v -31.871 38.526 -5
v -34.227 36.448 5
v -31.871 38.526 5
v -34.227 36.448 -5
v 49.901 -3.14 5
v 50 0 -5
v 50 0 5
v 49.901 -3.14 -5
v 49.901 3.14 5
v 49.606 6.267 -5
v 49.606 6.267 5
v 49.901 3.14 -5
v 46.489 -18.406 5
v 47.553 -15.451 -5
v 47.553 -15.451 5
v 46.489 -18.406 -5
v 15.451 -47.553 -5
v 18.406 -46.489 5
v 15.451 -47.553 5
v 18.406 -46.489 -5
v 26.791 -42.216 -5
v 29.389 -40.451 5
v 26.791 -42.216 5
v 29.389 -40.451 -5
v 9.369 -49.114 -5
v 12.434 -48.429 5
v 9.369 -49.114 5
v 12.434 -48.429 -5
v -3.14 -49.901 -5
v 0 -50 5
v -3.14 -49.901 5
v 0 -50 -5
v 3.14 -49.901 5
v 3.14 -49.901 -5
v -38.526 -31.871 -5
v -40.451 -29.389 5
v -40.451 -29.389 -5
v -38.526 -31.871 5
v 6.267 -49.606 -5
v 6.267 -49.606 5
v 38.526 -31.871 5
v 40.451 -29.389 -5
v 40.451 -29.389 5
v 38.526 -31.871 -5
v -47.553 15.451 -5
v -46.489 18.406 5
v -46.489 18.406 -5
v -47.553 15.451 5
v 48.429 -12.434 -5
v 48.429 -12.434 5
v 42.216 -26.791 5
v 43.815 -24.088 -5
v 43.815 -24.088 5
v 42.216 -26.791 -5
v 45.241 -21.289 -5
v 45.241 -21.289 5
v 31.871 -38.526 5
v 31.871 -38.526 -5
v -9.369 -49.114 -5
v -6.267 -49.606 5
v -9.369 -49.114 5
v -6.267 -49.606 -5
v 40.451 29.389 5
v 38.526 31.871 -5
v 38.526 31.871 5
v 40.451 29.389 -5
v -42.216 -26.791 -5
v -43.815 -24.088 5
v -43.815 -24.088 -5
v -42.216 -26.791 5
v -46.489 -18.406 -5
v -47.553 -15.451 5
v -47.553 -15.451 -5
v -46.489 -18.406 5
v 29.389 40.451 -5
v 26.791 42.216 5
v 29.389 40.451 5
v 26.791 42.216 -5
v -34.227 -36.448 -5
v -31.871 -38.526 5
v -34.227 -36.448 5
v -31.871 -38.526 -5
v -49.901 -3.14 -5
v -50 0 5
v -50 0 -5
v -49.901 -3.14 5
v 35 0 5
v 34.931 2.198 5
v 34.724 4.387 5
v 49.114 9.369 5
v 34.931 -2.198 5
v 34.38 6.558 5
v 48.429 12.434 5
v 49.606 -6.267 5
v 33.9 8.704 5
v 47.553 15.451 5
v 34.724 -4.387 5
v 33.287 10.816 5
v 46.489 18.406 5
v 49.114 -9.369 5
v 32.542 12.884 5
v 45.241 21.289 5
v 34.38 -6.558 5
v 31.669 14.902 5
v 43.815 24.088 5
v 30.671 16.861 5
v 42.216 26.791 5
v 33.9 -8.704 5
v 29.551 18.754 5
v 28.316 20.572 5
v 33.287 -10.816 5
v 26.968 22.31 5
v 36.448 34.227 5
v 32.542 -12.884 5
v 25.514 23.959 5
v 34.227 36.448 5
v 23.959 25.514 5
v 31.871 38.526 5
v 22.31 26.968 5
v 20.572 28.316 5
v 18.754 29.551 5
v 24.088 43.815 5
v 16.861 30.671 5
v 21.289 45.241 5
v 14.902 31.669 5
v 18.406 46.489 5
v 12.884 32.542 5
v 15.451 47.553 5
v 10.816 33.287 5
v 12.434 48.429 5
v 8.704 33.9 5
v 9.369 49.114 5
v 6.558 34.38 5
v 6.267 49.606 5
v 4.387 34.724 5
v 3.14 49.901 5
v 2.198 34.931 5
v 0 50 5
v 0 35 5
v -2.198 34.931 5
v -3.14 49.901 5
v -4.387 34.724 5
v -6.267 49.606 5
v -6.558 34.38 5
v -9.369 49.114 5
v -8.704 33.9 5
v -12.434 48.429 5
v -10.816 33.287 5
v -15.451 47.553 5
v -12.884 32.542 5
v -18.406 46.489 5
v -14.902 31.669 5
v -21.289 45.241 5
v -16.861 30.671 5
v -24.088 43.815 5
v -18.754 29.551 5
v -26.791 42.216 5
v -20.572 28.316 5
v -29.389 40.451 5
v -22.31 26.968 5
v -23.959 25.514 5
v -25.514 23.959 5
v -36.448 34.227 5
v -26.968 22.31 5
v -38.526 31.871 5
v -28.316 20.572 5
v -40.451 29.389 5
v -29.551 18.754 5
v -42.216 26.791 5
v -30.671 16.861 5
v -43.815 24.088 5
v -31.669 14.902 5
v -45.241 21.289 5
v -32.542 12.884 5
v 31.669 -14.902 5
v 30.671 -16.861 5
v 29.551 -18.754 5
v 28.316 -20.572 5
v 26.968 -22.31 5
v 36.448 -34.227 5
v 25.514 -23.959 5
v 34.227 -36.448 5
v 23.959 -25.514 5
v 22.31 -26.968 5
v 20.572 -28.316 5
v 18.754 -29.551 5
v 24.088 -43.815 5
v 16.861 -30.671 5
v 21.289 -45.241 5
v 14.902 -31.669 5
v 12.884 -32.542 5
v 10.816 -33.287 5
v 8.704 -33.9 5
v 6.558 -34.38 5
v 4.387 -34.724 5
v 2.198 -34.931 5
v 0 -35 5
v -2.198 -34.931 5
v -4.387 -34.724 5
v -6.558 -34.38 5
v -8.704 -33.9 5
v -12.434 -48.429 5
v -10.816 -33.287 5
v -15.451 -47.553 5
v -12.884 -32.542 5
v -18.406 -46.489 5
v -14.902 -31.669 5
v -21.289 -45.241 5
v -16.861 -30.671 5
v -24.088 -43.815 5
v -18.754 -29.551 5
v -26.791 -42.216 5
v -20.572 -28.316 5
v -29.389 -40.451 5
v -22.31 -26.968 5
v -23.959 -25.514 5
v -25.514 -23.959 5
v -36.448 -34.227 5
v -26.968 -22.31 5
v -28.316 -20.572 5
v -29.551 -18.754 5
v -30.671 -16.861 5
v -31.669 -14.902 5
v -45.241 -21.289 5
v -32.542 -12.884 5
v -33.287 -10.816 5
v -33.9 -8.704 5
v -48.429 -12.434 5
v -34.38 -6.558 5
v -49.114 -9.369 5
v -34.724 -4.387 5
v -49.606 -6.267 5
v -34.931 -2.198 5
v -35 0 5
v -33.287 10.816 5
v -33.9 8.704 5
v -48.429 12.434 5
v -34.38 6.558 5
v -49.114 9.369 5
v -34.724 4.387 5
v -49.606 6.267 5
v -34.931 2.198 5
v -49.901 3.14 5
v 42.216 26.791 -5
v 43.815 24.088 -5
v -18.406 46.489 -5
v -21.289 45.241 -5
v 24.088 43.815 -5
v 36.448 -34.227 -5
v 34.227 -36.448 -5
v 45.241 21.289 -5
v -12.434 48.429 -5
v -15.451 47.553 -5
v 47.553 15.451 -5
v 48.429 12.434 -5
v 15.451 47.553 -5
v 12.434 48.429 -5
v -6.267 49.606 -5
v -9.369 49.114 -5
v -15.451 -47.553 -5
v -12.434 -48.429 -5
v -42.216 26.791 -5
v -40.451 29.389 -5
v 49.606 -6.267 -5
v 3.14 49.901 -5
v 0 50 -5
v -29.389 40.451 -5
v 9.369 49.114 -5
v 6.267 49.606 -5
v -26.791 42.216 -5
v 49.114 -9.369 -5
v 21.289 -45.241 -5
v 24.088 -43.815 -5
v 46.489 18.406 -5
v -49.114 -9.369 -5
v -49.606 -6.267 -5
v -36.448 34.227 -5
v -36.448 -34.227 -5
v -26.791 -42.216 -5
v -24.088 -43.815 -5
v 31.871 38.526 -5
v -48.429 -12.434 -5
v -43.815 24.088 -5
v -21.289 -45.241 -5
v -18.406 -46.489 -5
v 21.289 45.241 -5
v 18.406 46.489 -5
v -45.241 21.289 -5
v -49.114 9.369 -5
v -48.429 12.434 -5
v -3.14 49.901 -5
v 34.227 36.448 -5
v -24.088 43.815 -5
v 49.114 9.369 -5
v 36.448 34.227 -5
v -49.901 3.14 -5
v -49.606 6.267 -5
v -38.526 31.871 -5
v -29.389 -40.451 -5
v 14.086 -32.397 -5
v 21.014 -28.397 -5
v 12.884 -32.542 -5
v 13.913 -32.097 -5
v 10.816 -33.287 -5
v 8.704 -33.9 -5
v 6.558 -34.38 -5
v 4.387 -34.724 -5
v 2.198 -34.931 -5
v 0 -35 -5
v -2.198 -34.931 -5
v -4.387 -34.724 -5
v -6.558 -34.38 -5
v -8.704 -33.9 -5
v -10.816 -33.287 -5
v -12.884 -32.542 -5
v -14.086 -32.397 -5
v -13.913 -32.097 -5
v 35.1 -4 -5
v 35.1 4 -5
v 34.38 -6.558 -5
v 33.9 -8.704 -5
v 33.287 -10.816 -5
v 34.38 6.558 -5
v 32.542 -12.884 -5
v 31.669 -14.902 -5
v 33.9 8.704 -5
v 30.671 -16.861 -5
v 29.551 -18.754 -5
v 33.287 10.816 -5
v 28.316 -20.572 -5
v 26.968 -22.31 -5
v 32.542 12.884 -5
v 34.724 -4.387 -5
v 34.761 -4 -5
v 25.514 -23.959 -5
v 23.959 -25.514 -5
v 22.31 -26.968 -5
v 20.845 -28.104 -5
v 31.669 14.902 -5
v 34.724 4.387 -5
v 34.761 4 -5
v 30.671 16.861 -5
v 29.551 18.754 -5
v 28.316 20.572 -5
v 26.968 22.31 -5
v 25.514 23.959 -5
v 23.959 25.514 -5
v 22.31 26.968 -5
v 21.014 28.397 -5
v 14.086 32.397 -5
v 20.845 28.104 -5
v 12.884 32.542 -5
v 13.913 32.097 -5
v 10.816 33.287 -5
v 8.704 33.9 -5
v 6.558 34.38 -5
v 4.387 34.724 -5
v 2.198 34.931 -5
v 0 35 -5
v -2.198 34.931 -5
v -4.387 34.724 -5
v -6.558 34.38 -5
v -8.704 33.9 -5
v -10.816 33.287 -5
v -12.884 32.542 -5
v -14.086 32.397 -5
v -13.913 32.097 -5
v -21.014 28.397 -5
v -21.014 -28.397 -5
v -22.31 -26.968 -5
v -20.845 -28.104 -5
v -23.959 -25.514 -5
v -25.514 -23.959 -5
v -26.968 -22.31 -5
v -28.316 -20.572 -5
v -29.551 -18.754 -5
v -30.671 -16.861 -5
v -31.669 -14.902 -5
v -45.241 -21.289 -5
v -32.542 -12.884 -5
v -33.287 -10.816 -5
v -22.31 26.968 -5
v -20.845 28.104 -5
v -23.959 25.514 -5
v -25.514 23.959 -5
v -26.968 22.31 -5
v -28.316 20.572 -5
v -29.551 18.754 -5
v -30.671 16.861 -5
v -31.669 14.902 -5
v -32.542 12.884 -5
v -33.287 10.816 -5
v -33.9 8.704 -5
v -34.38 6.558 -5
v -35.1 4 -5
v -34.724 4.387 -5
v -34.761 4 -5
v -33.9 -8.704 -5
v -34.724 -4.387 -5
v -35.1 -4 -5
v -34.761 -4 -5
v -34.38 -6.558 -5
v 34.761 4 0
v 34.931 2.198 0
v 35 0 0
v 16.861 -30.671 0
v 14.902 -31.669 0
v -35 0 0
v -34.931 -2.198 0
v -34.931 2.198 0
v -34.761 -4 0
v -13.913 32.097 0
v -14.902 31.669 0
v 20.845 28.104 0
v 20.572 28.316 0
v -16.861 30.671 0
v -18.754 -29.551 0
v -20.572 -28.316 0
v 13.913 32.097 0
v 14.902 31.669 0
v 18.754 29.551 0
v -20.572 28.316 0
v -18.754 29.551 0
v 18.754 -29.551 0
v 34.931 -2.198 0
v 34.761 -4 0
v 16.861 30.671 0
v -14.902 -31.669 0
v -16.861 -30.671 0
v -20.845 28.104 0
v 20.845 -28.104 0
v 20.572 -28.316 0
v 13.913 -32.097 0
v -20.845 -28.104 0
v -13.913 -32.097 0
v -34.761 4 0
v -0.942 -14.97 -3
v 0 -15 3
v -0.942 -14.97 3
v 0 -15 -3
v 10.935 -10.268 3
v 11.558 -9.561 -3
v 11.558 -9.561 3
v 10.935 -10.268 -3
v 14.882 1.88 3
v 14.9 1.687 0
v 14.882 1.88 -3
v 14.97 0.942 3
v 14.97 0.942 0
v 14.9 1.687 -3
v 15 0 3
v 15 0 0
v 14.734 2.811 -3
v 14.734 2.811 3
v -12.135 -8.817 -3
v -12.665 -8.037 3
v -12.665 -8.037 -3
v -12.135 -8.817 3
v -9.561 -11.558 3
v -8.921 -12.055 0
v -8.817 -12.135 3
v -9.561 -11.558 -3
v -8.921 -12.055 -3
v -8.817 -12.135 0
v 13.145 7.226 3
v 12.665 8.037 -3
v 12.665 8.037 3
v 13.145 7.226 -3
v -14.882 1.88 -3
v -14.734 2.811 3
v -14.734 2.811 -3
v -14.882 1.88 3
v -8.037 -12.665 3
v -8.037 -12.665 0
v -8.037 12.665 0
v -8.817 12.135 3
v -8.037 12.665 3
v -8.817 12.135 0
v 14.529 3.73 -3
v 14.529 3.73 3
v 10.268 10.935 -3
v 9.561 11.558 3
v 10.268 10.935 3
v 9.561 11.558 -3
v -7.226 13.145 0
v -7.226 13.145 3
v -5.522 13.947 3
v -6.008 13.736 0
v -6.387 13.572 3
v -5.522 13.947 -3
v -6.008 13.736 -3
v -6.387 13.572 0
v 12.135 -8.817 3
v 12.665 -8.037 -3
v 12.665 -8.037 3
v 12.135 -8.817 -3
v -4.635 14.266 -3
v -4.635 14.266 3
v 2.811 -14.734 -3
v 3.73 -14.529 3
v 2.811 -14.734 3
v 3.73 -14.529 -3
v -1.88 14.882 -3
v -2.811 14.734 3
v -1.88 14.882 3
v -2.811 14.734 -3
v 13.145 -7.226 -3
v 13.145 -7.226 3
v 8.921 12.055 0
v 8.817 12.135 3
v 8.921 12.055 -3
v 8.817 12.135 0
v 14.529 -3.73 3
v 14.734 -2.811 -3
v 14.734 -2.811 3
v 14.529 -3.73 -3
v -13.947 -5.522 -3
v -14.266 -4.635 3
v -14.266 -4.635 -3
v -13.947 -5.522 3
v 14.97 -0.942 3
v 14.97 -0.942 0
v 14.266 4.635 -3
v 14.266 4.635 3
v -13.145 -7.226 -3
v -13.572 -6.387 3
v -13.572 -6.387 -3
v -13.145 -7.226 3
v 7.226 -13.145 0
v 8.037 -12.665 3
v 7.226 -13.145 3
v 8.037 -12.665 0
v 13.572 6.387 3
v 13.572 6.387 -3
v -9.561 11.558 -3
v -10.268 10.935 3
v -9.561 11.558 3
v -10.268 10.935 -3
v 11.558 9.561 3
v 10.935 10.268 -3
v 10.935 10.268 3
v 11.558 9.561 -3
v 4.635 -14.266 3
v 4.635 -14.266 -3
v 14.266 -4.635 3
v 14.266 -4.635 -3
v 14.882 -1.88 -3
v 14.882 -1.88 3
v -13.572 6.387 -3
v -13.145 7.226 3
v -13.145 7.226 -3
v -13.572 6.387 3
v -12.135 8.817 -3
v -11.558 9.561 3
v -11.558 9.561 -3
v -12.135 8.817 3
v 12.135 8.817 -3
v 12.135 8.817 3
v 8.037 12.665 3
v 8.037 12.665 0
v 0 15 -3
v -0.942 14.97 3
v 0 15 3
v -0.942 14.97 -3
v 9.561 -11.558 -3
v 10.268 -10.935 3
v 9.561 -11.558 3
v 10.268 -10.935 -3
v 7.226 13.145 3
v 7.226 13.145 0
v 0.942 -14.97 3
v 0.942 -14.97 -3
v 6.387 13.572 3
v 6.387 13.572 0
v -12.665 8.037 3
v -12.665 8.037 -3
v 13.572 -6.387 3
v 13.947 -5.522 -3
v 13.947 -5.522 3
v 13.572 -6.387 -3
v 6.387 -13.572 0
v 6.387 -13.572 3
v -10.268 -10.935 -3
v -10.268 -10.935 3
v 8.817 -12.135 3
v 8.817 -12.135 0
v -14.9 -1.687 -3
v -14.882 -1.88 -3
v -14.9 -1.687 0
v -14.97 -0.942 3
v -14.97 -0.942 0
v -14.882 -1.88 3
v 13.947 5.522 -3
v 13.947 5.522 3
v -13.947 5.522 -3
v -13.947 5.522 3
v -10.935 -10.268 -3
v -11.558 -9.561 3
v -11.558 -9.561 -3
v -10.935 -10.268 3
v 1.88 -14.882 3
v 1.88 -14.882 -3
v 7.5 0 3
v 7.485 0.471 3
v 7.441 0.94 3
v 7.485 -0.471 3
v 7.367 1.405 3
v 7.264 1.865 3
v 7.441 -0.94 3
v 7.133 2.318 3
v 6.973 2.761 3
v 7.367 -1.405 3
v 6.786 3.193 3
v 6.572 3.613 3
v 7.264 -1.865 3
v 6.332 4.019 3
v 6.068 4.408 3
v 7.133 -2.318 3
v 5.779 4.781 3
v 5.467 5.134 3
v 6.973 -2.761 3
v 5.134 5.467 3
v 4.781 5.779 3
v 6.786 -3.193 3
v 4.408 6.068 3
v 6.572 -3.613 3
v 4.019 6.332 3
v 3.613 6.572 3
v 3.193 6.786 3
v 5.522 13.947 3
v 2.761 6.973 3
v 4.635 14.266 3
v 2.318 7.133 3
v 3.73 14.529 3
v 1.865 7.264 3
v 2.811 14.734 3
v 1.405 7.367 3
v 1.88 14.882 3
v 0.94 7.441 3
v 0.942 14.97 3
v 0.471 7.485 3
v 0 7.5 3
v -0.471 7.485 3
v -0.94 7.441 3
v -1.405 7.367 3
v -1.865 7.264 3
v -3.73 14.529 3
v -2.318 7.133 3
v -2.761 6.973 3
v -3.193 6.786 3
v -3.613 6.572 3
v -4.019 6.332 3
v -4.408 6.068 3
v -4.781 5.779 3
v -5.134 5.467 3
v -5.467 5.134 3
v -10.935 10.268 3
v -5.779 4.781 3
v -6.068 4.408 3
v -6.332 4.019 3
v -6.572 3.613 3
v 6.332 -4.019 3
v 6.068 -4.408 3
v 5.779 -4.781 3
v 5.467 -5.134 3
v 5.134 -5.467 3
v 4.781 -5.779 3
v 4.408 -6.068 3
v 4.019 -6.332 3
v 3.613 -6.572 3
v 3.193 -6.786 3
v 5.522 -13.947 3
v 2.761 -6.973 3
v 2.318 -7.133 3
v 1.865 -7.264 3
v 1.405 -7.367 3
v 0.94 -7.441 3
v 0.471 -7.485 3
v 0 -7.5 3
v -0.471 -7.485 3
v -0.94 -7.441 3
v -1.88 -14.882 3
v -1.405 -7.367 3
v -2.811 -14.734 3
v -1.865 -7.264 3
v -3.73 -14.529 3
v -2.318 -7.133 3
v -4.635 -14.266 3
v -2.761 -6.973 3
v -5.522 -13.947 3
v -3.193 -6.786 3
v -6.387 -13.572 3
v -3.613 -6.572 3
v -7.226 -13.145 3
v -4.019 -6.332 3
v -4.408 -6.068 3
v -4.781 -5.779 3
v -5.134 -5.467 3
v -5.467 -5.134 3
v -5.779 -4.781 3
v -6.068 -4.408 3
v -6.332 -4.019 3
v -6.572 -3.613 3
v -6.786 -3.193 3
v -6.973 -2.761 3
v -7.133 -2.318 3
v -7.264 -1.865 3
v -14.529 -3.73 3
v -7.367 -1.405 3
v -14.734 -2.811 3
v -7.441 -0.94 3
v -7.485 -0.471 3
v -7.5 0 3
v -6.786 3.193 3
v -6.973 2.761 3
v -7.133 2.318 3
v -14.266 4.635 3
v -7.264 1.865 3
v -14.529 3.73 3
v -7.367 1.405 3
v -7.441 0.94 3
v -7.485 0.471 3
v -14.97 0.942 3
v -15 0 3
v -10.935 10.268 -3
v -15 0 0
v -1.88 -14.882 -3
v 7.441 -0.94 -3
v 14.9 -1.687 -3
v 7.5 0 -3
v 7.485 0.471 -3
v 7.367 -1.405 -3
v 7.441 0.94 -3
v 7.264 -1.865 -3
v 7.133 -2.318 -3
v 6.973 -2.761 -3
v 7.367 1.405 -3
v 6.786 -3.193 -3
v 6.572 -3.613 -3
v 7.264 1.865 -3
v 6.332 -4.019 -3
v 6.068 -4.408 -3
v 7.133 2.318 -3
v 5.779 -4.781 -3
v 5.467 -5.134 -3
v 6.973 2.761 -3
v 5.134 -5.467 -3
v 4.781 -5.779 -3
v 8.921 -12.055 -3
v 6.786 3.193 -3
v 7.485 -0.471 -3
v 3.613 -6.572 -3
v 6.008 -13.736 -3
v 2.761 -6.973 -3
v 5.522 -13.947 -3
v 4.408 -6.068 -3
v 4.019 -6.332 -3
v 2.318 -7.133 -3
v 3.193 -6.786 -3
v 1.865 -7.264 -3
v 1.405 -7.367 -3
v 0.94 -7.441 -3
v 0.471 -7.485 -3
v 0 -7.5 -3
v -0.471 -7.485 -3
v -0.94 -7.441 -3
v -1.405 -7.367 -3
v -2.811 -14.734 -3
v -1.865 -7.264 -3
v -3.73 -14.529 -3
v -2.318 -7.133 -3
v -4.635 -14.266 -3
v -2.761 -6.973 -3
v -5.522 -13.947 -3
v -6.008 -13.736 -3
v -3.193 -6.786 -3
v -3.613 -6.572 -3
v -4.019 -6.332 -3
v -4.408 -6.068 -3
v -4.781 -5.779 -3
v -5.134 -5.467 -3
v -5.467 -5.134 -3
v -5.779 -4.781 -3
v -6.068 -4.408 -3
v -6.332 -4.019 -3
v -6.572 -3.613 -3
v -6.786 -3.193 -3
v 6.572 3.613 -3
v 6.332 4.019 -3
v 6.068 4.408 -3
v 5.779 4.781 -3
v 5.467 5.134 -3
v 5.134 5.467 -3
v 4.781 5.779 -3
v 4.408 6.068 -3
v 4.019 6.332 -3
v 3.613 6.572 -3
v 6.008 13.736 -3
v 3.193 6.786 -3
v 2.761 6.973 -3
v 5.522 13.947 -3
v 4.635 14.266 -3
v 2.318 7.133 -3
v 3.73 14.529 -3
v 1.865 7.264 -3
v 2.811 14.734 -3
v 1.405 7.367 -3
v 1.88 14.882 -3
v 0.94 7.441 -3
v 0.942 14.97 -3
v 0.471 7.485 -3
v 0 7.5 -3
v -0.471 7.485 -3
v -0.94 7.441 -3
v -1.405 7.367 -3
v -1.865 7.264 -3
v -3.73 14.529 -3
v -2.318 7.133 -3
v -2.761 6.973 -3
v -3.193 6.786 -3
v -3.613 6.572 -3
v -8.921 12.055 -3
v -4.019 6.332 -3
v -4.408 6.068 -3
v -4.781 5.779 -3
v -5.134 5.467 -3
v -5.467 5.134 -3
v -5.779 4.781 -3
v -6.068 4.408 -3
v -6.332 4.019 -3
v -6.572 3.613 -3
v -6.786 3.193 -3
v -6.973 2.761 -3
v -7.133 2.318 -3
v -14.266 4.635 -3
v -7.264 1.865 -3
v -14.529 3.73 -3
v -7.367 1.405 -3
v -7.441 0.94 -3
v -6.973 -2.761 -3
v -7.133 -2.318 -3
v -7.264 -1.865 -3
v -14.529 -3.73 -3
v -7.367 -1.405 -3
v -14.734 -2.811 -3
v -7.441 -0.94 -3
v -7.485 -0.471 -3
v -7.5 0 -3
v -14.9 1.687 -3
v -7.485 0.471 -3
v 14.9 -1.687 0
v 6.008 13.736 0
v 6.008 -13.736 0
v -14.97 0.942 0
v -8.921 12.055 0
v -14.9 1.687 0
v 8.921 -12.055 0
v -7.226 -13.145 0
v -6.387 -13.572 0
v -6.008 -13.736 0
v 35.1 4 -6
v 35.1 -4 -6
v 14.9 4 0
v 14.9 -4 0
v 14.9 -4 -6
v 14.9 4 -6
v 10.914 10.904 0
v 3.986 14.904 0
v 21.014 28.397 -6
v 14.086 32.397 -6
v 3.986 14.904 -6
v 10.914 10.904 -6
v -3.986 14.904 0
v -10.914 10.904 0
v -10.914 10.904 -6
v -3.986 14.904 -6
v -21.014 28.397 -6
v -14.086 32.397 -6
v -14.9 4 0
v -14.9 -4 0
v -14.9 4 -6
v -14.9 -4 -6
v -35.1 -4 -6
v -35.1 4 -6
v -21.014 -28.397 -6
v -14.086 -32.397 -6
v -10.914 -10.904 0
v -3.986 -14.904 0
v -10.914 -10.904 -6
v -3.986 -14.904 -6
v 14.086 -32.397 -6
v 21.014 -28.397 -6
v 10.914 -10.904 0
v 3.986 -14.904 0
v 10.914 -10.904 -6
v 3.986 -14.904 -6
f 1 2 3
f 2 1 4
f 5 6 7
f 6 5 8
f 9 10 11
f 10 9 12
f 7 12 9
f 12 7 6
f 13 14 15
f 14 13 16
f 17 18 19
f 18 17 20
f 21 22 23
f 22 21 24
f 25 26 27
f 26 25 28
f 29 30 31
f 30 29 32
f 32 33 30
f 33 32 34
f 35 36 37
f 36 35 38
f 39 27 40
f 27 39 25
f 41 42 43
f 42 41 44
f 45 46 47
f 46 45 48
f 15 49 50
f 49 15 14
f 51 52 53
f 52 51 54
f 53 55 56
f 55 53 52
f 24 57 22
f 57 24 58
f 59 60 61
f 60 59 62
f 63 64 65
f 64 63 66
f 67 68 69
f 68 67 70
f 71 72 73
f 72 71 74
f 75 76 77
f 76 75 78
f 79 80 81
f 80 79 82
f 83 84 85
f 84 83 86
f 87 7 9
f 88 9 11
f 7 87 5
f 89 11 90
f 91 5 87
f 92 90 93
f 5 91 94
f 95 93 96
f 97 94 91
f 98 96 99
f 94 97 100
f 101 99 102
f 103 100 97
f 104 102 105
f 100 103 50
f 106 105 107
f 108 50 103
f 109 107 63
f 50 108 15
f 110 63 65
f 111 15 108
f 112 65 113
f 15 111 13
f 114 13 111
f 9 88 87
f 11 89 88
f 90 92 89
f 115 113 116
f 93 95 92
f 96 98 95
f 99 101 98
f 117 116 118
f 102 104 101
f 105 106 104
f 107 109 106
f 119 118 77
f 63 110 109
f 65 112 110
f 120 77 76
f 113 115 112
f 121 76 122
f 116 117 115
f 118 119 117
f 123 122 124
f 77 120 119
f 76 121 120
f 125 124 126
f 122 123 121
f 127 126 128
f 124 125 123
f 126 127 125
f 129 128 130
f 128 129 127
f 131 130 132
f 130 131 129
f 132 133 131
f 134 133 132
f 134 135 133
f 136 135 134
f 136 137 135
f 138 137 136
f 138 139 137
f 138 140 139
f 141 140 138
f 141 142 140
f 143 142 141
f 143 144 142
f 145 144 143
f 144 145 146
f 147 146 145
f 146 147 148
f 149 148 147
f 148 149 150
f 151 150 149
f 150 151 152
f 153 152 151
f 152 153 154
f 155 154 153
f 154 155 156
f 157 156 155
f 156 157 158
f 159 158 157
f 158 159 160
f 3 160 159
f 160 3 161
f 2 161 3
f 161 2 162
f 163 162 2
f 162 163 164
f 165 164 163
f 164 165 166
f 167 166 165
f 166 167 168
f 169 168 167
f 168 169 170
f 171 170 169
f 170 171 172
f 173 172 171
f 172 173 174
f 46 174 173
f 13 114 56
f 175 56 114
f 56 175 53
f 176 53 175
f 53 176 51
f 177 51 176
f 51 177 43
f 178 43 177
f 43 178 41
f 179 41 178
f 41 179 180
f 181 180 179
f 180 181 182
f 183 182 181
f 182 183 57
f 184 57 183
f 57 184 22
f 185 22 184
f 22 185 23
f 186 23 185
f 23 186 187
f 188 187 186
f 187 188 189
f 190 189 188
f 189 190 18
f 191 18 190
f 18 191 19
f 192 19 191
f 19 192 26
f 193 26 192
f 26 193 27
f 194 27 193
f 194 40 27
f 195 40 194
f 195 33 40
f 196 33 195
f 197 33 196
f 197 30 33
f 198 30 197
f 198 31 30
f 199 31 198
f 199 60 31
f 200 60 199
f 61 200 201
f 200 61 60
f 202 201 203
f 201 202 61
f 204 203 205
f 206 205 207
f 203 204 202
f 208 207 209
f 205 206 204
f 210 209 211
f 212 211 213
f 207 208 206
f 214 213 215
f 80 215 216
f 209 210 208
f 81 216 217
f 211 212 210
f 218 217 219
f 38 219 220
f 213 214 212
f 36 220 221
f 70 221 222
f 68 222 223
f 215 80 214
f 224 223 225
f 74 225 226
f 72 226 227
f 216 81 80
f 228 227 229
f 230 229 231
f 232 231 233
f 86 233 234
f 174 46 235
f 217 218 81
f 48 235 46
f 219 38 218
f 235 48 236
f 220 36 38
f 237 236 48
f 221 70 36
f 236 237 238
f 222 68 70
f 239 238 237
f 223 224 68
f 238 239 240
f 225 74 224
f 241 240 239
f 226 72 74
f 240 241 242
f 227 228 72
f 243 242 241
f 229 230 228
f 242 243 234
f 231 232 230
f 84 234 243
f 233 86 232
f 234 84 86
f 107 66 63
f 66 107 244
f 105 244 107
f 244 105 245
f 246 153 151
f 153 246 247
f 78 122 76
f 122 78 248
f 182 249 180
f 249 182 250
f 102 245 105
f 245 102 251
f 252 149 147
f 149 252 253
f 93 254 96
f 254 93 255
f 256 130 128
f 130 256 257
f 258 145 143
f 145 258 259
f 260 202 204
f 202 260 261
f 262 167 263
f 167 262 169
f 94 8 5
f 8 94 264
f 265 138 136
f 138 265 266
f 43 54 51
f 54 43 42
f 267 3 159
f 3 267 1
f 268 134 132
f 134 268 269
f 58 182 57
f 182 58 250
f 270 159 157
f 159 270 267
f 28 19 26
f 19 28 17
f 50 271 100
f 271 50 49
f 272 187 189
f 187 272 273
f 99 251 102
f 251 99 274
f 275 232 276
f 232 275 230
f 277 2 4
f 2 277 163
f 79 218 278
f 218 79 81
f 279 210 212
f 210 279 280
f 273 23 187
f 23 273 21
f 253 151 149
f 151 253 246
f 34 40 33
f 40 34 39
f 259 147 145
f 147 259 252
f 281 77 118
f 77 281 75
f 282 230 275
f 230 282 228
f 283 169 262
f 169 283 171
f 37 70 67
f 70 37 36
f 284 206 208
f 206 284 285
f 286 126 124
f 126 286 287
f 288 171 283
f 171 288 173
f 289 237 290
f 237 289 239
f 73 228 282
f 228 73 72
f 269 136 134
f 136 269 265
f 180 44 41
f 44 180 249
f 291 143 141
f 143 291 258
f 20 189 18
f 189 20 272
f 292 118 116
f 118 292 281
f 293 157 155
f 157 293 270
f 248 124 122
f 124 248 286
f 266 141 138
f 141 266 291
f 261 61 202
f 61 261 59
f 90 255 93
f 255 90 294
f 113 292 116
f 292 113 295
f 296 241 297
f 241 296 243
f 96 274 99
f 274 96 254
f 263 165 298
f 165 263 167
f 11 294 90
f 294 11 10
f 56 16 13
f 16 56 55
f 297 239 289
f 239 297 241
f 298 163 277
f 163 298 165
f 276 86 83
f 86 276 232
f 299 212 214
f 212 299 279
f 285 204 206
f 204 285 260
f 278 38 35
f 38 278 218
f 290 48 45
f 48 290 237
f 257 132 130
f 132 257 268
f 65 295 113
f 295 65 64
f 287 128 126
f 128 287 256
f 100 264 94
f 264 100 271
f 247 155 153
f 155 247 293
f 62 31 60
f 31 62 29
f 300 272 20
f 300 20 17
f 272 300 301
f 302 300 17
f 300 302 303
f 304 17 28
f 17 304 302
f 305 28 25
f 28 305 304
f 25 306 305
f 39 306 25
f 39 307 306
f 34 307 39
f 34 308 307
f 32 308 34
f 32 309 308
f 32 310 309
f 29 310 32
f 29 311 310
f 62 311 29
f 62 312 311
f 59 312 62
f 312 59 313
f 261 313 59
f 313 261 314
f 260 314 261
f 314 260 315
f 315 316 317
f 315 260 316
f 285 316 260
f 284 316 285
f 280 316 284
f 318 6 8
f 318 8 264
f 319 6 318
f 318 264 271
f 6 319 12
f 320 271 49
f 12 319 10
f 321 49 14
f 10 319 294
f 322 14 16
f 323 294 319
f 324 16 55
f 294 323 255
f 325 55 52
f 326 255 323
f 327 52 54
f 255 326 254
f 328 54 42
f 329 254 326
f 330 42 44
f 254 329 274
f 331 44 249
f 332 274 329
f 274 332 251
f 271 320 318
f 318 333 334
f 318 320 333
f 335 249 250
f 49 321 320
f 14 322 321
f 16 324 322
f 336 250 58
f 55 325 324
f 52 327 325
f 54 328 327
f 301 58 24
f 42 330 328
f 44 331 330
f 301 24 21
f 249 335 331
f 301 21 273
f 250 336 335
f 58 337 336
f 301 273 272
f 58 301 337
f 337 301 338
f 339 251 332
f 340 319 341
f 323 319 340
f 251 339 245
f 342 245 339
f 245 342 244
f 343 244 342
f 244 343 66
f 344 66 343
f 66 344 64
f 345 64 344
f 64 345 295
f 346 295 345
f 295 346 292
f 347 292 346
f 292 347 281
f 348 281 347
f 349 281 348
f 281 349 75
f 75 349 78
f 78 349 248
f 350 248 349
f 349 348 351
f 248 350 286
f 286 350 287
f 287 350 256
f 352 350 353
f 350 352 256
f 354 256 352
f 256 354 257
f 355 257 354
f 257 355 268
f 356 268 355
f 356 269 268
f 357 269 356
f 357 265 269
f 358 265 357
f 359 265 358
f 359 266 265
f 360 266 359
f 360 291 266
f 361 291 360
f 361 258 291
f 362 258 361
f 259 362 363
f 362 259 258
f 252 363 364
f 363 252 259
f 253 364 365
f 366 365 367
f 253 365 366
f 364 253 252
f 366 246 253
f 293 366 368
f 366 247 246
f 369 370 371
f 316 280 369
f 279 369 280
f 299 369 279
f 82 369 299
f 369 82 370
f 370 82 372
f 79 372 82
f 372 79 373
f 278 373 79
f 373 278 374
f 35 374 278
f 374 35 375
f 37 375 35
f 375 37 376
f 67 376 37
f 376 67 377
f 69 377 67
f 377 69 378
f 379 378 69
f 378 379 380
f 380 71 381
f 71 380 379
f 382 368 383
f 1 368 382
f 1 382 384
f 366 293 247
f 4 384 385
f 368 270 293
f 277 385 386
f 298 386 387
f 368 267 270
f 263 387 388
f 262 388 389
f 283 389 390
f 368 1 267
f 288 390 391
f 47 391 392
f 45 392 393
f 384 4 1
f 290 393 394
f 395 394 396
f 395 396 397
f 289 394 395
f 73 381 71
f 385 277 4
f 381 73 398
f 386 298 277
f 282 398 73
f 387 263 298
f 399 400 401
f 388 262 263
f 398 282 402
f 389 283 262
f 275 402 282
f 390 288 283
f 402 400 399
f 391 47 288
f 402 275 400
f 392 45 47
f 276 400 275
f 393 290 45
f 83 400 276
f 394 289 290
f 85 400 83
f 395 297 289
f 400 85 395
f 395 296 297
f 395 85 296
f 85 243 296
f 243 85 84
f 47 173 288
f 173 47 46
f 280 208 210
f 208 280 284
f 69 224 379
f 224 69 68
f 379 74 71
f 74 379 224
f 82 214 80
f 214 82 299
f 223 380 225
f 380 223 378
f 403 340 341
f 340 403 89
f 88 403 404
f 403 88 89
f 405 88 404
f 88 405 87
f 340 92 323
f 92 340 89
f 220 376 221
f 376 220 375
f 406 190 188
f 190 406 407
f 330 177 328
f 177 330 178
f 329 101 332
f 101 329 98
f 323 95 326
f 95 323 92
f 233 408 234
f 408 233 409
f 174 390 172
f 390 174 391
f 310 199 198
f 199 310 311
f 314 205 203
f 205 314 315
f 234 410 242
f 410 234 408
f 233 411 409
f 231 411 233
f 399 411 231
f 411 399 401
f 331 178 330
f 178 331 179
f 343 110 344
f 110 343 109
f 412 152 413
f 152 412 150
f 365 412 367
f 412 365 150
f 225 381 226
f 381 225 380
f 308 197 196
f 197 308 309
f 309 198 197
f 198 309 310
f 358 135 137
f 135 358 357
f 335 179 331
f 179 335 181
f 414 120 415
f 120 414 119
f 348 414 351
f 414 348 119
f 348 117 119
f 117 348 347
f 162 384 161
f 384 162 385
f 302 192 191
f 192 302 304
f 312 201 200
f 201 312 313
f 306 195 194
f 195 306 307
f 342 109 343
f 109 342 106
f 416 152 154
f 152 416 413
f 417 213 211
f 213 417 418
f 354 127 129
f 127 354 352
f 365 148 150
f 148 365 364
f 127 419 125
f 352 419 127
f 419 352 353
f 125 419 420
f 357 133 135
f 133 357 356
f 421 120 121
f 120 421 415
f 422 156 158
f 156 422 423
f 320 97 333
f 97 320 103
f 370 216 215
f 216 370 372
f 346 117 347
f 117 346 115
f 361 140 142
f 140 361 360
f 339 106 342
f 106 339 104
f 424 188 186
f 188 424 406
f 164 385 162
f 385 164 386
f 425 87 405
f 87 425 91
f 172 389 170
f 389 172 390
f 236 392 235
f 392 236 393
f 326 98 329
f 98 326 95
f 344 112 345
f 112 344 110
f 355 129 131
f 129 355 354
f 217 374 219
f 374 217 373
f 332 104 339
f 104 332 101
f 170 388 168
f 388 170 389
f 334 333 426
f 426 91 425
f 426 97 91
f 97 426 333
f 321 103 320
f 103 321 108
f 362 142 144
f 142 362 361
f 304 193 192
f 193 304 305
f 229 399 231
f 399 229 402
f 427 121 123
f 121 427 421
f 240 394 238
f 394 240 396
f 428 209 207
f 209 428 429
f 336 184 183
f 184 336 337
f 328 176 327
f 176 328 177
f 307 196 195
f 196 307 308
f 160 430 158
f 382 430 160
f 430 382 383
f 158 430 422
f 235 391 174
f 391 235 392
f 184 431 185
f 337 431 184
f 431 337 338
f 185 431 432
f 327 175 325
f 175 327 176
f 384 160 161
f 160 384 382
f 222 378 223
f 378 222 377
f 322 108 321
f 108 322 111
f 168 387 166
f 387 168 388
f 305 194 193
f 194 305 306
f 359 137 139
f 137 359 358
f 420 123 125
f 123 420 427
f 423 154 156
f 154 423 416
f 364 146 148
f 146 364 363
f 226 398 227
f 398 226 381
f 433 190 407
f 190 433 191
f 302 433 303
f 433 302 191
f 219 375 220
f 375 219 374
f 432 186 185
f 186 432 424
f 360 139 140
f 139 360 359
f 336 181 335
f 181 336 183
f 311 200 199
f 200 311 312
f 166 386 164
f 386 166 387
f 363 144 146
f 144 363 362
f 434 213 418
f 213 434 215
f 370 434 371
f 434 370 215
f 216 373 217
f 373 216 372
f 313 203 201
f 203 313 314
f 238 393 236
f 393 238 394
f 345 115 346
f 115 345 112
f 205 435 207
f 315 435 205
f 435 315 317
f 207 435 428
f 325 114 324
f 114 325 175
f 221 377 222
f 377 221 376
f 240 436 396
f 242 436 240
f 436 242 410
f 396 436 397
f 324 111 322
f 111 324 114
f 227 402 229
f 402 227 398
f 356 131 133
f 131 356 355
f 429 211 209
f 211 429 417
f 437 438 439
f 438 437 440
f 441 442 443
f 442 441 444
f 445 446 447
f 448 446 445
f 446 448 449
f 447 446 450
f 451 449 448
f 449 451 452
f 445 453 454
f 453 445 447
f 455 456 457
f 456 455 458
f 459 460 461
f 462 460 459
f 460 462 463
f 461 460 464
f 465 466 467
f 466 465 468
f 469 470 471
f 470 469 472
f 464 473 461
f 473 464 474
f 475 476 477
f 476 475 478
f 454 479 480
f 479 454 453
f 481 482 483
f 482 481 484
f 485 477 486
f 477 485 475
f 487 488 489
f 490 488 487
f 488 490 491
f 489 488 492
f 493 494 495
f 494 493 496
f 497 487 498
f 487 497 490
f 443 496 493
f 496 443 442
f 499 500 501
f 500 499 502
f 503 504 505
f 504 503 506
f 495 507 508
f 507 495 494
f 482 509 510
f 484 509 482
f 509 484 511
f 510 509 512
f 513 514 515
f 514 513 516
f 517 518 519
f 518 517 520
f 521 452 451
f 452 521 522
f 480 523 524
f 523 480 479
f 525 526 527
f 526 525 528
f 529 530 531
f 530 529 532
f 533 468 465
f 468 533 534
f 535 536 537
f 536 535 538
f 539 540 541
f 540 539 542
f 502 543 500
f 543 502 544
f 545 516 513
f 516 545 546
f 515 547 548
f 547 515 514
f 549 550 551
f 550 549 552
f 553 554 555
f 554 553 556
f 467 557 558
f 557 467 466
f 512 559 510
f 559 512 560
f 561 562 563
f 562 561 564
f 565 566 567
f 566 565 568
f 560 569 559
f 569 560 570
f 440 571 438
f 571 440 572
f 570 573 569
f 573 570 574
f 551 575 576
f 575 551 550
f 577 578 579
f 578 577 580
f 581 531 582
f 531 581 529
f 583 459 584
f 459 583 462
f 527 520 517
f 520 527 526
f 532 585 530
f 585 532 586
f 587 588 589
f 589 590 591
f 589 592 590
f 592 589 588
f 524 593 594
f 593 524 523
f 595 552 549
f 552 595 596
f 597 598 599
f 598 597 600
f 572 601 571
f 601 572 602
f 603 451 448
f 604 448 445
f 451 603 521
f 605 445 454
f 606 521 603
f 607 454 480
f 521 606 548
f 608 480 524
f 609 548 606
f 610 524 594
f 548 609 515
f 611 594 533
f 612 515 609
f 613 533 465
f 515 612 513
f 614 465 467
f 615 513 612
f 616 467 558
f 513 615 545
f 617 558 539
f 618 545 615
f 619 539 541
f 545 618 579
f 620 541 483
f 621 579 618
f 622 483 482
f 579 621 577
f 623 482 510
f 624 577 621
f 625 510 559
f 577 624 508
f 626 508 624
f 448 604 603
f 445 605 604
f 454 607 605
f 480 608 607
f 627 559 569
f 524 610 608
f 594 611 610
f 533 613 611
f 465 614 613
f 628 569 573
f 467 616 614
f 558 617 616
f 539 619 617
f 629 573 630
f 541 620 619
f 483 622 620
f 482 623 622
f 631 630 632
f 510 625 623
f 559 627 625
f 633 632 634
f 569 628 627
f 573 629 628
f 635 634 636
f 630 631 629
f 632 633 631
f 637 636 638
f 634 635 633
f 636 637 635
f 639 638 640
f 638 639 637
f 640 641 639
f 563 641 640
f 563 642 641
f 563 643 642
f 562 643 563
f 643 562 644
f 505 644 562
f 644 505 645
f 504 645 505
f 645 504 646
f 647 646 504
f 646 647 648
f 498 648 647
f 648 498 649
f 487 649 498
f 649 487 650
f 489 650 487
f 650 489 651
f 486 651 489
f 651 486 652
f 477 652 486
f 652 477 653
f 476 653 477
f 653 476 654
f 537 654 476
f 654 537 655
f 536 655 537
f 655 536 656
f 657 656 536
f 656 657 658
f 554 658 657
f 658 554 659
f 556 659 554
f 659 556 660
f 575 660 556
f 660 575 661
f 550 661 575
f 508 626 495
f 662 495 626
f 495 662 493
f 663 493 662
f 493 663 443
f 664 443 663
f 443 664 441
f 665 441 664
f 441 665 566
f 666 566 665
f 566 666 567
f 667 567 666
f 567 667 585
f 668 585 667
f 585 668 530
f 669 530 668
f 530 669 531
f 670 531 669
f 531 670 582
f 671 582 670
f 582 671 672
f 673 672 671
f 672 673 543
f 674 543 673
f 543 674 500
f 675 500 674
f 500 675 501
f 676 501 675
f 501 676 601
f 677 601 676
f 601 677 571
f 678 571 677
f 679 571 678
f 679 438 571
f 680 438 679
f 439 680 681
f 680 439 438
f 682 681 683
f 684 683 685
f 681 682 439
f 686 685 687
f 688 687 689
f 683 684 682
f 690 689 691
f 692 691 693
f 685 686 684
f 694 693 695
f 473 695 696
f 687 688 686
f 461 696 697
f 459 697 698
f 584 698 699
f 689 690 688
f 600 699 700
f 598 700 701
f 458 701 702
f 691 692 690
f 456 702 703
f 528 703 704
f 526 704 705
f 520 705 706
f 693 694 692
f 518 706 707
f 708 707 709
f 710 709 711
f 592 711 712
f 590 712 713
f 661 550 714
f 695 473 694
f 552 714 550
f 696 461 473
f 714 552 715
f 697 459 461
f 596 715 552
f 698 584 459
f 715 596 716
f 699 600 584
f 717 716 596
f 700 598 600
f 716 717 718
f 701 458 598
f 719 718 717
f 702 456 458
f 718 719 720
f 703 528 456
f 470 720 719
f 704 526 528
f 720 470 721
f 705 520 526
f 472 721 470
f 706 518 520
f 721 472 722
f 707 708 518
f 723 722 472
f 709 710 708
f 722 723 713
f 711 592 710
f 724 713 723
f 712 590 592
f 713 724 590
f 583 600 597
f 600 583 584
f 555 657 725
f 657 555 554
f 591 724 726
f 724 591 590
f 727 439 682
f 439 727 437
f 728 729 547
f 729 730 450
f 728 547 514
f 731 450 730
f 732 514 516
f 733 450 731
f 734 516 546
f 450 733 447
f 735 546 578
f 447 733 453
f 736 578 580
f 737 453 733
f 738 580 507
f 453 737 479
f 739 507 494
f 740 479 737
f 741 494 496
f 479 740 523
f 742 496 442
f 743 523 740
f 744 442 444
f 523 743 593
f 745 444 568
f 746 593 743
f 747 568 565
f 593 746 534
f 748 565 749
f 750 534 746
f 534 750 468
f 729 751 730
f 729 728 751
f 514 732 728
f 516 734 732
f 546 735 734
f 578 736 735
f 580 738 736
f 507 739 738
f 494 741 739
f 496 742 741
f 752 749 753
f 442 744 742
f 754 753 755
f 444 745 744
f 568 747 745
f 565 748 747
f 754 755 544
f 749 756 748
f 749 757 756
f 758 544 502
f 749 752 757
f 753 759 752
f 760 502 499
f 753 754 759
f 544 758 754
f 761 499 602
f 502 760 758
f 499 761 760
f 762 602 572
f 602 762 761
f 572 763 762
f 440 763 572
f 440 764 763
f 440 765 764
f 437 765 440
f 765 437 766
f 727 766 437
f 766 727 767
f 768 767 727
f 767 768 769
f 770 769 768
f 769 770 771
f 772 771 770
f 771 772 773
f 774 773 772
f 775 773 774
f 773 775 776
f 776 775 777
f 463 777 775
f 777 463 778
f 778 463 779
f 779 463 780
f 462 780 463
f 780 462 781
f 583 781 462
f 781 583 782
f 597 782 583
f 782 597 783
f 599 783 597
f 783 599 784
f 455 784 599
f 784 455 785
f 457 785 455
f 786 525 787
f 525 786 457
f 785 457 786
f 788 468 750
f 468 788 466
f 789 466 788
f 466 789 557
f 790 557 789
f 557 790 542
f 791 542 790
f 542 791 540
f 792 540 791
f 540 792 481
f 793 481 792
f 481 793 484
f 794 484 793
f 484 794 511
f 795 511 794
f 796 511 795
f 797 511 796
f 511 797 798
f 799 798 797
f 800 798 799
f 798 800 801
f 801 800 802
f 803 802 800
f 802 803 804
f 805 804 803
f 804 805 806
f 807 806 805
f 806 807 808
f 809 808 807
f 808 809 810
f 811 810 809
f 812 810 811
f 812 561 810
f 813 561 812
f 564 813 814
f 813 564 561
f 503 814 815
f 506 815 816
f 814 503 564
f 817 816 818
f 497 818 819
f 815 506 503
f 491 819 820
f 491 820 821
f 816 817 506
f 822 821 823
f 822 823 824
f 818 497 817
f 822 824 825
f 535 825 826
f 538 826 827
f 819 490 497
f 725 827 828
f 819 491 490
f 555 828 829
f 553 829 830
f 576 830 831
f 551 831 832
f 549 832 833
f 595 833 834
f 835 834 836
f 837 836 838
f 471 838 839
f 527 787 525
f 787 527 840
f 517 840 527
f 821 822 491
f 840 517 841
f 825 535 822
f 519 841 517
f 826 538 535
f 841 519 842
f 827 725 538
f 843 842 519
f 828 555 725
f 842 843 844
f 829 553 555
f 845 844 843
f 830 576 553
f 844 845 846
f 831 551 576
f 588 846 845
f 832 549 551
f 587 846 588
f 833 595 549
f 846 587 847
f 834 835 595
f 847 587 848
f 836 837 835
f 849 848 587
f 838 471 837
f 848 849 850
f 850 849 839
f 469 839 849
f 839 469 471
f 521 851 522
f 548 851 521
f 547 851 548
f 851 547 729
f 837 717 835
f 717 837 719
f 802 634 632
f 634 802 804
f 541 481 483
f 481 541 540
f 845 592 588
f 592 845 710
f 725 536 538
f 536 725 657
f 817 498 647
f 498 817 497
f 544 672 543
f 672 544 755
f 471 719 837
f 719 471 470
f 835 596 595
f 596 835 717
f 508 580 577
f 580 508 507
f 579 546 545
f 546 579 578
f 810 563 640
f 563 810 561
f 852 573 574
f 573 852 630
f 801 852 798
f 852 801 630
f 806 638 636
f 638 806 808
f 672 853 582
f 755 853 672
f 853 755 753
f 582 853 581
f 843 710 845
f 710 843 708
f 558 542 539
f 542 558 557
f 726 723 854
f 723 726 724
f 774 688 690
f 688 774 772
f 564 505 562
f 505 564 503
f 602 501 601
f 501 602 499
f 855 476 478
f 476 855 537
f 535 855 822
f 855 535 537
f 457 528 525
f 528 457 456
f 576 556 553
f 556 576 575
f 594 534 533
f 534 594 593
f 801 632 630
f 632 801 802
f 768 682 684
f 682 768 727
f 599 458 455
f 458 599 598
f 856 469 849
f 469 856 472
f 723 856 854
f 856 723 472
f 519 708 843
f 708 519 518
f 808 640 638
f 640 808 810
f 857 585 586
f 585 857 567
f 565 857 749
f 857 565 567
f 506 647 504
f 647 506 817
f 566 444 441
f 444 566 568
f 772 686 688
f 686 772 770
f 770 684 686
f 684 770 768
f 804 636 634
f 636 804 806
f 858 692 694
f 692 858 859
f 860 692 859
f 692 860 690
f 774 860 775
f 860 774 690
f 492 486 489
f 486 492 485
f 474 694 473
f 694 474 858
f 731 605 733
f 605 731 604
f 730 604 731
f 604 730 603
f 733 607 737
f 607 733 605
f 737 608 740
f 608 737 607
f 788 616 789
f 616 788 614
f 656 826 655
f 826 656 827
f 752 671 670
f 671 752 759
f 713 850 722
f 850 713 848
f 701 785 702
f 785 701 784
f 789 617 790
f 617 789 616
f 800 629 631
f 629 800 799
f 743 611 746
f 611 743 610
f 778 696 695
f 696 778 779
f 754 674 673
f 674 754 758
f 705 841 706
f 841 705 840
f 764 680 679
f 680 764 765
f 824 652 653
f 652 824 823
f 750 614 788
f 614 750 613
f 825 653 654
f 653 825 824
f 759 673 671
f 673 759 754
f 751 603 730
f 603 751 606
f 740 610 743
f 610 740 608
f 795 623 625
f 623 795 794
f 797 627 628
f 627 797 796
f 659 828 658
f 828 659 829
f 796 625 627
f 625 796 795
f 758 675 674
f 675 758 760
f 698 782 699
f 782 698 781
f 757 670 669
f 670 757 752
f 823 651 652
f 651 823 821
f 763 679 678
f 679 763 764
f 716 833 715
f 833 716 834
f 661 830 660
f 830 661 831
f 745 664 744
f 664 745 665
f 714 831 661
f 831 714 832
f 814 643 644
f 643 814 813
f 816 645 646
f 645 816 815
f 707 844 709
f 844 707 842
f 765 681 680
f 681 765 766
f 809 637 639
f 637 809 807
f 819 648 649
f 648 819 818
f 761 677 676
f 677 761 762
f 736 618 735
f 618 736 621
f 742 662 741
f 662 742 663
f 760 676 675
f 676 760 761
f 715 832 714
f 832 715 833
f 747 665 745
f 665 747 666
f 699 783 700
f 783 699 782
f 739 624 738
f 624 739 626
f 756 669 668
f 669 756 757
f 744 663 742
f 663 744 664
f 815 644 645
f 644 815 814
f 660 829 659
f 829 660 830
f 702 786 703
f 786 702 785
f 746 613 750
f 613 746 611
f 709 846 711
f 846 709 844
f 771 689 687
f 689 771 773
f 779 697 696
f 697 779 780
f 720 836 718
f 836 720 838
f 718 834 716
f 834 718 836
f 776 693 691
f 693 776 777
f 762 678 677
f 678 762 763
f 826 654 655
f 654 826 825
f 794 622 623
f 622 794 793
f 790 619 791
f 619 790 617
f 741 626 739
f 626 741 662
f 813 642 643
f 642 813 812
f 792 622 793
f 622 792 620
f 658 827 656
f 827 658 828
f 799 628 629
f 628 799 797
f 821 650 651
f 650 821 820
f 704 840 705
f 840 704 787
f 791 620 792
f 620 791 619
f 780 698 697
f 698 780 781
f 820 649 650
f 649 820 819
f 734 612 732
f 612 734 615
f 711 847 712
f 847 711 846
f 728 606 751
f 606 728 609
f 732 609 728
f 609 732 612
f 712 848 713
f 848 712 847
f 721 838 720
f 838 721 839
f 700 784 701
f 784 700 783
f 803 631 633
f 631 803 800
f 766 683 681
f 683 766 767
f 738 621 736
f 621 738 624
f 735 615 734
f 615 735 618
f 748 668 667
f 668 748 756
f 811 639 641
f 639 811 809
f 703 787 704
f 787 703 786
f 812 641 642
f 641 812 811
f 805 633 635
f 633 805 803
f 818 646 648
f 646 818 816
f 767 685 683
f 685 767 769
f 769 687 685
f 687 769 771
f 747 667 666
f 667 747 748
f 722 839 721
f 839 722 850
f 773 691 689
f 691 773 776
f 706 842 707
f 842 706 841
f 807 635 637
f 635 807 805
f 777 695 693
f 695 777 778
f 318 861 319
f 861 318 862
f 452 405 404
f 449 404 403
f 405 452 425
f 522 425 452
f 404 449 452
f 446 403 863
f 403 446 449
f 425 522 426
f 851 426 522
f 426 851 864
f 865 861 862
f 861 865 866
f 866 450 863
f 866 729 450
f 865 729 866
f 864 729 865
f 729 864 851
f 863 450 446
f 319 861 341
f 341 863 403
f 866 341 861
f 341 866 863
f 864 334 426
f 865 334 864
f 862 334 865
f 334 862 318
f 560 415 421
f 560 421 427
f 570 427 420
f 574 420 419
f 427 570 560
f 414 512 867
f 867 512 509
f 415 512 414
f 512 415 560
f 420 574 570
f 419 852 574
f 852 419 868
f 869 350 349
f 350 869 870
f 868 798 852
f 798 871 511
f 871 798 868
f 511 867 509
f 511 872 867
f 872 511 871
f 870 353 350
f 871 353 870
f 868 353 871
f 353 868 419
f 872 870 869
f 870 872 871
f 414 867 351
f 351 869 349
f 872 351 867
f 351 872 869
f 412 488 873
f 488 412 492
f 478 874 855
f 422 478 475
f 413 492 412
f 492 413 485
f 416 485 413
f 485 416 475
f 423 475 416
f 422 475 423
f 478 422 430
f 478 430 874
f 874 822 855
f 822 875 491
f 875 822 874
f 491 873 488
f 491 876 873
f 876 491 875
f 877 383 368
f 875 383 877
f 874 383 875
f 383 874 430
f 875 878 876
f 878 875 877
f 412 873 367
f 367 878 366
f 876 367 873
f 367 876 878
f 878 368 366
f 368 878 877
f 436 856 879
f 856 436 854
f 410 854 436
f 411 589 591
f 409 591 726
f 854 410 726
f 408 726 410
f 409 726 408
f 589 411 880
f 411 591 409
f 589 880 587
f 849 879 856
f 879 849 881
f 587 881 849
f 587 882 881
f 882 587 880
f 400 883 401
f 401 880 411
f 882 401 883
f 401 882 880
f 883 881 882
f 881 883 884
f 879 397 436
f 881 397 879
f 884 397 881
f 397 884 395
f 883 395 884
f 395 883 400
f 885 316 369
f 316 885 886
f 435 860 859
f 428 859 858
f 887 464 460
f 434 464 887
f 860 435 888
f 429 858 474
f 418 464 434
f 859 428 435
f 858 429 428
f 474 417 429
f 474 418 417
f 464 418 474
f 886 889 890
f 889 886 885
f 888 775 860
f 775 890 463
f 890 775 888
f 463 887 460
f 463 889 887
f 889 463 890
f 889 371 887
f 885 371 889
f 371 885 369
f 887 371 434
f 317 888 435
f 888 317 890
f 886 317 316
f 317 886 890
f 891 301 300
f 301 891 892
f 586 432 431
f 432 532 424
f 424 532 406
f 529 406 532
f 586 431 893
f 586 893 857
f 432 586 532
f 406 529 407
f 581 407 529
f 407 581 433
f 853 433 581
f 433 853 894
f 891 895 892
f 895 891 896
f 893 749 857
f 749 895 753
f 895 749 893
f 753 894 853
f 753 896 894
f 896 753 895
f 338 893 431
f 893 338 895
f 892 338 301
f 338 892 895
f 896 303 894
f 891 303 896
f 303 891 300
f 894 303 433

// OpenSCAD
// ==========================================
// Parametric Annular Rim with Hollow Collar,
// Radial Ribs, and Stepped Underside Relief
// ==========================================

// --- Resolution ---
$fn = 100;

// --- Outer Annular Rim ---
outer_ring_od       = 100;   // overall outer diameter
outer_ring_id       = 70;    // inner diameter of rim (start of window zone)
outer_ring_depth    = 10;    // full depth of the main outer rim

// --- Hollow Collar (central hub) ---
collar_od           = 30;    // outer diameter of collar
collar_id           = 15;    // bore diameter (hollow center)
web_depth           = 6;     // shallower depth for collar and ribs

// --- Radial Ribs ---
rib_count           = 6;     // number of solid radial ribs
rib_width           = 8;     // circumferential width of each rib

// --- Tolerance overlap for clean unions ---
overlap             = 0.1;

// --- Derived radii ---
outer_ring_or       = outer_ring_od / 2;
outer_ring_ir       = outer_ring_id / 2;
collar_or           = collar_od / 2;
collar_ir           = collar_id / 2;

// ==========================================
// Modules
// ==========================================

// Main outer rim: deep annular ring
module outer_rim() {
    difference() {
        // solid outer cylinder, centered on z so top face is at z = 0
        translate([0, 0, -outer_ring_depth / 2])
            cylinder(h = outer_ring_depth, r = outer_ring_or);
        // subtract inner hole (extend slightly for robust difference)
        translate([0, 0, -outer_ring_depth / 2 - overlap])
            cylinder(h = outer_ring_depth + 2 * overlap, r = outer_ring_ir);
    }
}

// Hollow collar: shallower concentric ring
module collar() {
    difference() {
        translate([0, 0, -web_depth / 2])
            cylinder(h = web_depth, r = collar_or);
        // bore through collar
        translate([0, 0, -web_depth / 2 - overlap])
            cylinder(h = web_depth + 2 * overlap, r = collar_ir);
    }
}

// Single radial rib: shallow web connecting collar to rim
module rib(angle) {
    // radial length from collar outer edge to rim inner edge
    rib_length = outer_ring_ir - collar_or + 2 * overlap;
    mid_radius = (outer_ring_ir + collar_or) / 2;

    rotate([0, 0, angle])
        translate([mid_radius, 0, -web_depth / 2])
            cube([rib_length, rib_width, web_depth], center = true);
}

// Array of ribs spaced evenly around the axis
module all_ribs() {
    for (i = [0 : rib_count - 1]) {
        rib(i * 360 / rib_count);
    }
}

// ==========================================
// Assembly
// ==========================================

union() {
    // deepest tier: outer annular rim
    outer_rim();

    // shallower tier: central hollow collar
    collar();

    // shallower tier: solid radial ribs bridging collar and rim,
    // leaving rounded slot-like window spaces between them
    all_ribs();
}
